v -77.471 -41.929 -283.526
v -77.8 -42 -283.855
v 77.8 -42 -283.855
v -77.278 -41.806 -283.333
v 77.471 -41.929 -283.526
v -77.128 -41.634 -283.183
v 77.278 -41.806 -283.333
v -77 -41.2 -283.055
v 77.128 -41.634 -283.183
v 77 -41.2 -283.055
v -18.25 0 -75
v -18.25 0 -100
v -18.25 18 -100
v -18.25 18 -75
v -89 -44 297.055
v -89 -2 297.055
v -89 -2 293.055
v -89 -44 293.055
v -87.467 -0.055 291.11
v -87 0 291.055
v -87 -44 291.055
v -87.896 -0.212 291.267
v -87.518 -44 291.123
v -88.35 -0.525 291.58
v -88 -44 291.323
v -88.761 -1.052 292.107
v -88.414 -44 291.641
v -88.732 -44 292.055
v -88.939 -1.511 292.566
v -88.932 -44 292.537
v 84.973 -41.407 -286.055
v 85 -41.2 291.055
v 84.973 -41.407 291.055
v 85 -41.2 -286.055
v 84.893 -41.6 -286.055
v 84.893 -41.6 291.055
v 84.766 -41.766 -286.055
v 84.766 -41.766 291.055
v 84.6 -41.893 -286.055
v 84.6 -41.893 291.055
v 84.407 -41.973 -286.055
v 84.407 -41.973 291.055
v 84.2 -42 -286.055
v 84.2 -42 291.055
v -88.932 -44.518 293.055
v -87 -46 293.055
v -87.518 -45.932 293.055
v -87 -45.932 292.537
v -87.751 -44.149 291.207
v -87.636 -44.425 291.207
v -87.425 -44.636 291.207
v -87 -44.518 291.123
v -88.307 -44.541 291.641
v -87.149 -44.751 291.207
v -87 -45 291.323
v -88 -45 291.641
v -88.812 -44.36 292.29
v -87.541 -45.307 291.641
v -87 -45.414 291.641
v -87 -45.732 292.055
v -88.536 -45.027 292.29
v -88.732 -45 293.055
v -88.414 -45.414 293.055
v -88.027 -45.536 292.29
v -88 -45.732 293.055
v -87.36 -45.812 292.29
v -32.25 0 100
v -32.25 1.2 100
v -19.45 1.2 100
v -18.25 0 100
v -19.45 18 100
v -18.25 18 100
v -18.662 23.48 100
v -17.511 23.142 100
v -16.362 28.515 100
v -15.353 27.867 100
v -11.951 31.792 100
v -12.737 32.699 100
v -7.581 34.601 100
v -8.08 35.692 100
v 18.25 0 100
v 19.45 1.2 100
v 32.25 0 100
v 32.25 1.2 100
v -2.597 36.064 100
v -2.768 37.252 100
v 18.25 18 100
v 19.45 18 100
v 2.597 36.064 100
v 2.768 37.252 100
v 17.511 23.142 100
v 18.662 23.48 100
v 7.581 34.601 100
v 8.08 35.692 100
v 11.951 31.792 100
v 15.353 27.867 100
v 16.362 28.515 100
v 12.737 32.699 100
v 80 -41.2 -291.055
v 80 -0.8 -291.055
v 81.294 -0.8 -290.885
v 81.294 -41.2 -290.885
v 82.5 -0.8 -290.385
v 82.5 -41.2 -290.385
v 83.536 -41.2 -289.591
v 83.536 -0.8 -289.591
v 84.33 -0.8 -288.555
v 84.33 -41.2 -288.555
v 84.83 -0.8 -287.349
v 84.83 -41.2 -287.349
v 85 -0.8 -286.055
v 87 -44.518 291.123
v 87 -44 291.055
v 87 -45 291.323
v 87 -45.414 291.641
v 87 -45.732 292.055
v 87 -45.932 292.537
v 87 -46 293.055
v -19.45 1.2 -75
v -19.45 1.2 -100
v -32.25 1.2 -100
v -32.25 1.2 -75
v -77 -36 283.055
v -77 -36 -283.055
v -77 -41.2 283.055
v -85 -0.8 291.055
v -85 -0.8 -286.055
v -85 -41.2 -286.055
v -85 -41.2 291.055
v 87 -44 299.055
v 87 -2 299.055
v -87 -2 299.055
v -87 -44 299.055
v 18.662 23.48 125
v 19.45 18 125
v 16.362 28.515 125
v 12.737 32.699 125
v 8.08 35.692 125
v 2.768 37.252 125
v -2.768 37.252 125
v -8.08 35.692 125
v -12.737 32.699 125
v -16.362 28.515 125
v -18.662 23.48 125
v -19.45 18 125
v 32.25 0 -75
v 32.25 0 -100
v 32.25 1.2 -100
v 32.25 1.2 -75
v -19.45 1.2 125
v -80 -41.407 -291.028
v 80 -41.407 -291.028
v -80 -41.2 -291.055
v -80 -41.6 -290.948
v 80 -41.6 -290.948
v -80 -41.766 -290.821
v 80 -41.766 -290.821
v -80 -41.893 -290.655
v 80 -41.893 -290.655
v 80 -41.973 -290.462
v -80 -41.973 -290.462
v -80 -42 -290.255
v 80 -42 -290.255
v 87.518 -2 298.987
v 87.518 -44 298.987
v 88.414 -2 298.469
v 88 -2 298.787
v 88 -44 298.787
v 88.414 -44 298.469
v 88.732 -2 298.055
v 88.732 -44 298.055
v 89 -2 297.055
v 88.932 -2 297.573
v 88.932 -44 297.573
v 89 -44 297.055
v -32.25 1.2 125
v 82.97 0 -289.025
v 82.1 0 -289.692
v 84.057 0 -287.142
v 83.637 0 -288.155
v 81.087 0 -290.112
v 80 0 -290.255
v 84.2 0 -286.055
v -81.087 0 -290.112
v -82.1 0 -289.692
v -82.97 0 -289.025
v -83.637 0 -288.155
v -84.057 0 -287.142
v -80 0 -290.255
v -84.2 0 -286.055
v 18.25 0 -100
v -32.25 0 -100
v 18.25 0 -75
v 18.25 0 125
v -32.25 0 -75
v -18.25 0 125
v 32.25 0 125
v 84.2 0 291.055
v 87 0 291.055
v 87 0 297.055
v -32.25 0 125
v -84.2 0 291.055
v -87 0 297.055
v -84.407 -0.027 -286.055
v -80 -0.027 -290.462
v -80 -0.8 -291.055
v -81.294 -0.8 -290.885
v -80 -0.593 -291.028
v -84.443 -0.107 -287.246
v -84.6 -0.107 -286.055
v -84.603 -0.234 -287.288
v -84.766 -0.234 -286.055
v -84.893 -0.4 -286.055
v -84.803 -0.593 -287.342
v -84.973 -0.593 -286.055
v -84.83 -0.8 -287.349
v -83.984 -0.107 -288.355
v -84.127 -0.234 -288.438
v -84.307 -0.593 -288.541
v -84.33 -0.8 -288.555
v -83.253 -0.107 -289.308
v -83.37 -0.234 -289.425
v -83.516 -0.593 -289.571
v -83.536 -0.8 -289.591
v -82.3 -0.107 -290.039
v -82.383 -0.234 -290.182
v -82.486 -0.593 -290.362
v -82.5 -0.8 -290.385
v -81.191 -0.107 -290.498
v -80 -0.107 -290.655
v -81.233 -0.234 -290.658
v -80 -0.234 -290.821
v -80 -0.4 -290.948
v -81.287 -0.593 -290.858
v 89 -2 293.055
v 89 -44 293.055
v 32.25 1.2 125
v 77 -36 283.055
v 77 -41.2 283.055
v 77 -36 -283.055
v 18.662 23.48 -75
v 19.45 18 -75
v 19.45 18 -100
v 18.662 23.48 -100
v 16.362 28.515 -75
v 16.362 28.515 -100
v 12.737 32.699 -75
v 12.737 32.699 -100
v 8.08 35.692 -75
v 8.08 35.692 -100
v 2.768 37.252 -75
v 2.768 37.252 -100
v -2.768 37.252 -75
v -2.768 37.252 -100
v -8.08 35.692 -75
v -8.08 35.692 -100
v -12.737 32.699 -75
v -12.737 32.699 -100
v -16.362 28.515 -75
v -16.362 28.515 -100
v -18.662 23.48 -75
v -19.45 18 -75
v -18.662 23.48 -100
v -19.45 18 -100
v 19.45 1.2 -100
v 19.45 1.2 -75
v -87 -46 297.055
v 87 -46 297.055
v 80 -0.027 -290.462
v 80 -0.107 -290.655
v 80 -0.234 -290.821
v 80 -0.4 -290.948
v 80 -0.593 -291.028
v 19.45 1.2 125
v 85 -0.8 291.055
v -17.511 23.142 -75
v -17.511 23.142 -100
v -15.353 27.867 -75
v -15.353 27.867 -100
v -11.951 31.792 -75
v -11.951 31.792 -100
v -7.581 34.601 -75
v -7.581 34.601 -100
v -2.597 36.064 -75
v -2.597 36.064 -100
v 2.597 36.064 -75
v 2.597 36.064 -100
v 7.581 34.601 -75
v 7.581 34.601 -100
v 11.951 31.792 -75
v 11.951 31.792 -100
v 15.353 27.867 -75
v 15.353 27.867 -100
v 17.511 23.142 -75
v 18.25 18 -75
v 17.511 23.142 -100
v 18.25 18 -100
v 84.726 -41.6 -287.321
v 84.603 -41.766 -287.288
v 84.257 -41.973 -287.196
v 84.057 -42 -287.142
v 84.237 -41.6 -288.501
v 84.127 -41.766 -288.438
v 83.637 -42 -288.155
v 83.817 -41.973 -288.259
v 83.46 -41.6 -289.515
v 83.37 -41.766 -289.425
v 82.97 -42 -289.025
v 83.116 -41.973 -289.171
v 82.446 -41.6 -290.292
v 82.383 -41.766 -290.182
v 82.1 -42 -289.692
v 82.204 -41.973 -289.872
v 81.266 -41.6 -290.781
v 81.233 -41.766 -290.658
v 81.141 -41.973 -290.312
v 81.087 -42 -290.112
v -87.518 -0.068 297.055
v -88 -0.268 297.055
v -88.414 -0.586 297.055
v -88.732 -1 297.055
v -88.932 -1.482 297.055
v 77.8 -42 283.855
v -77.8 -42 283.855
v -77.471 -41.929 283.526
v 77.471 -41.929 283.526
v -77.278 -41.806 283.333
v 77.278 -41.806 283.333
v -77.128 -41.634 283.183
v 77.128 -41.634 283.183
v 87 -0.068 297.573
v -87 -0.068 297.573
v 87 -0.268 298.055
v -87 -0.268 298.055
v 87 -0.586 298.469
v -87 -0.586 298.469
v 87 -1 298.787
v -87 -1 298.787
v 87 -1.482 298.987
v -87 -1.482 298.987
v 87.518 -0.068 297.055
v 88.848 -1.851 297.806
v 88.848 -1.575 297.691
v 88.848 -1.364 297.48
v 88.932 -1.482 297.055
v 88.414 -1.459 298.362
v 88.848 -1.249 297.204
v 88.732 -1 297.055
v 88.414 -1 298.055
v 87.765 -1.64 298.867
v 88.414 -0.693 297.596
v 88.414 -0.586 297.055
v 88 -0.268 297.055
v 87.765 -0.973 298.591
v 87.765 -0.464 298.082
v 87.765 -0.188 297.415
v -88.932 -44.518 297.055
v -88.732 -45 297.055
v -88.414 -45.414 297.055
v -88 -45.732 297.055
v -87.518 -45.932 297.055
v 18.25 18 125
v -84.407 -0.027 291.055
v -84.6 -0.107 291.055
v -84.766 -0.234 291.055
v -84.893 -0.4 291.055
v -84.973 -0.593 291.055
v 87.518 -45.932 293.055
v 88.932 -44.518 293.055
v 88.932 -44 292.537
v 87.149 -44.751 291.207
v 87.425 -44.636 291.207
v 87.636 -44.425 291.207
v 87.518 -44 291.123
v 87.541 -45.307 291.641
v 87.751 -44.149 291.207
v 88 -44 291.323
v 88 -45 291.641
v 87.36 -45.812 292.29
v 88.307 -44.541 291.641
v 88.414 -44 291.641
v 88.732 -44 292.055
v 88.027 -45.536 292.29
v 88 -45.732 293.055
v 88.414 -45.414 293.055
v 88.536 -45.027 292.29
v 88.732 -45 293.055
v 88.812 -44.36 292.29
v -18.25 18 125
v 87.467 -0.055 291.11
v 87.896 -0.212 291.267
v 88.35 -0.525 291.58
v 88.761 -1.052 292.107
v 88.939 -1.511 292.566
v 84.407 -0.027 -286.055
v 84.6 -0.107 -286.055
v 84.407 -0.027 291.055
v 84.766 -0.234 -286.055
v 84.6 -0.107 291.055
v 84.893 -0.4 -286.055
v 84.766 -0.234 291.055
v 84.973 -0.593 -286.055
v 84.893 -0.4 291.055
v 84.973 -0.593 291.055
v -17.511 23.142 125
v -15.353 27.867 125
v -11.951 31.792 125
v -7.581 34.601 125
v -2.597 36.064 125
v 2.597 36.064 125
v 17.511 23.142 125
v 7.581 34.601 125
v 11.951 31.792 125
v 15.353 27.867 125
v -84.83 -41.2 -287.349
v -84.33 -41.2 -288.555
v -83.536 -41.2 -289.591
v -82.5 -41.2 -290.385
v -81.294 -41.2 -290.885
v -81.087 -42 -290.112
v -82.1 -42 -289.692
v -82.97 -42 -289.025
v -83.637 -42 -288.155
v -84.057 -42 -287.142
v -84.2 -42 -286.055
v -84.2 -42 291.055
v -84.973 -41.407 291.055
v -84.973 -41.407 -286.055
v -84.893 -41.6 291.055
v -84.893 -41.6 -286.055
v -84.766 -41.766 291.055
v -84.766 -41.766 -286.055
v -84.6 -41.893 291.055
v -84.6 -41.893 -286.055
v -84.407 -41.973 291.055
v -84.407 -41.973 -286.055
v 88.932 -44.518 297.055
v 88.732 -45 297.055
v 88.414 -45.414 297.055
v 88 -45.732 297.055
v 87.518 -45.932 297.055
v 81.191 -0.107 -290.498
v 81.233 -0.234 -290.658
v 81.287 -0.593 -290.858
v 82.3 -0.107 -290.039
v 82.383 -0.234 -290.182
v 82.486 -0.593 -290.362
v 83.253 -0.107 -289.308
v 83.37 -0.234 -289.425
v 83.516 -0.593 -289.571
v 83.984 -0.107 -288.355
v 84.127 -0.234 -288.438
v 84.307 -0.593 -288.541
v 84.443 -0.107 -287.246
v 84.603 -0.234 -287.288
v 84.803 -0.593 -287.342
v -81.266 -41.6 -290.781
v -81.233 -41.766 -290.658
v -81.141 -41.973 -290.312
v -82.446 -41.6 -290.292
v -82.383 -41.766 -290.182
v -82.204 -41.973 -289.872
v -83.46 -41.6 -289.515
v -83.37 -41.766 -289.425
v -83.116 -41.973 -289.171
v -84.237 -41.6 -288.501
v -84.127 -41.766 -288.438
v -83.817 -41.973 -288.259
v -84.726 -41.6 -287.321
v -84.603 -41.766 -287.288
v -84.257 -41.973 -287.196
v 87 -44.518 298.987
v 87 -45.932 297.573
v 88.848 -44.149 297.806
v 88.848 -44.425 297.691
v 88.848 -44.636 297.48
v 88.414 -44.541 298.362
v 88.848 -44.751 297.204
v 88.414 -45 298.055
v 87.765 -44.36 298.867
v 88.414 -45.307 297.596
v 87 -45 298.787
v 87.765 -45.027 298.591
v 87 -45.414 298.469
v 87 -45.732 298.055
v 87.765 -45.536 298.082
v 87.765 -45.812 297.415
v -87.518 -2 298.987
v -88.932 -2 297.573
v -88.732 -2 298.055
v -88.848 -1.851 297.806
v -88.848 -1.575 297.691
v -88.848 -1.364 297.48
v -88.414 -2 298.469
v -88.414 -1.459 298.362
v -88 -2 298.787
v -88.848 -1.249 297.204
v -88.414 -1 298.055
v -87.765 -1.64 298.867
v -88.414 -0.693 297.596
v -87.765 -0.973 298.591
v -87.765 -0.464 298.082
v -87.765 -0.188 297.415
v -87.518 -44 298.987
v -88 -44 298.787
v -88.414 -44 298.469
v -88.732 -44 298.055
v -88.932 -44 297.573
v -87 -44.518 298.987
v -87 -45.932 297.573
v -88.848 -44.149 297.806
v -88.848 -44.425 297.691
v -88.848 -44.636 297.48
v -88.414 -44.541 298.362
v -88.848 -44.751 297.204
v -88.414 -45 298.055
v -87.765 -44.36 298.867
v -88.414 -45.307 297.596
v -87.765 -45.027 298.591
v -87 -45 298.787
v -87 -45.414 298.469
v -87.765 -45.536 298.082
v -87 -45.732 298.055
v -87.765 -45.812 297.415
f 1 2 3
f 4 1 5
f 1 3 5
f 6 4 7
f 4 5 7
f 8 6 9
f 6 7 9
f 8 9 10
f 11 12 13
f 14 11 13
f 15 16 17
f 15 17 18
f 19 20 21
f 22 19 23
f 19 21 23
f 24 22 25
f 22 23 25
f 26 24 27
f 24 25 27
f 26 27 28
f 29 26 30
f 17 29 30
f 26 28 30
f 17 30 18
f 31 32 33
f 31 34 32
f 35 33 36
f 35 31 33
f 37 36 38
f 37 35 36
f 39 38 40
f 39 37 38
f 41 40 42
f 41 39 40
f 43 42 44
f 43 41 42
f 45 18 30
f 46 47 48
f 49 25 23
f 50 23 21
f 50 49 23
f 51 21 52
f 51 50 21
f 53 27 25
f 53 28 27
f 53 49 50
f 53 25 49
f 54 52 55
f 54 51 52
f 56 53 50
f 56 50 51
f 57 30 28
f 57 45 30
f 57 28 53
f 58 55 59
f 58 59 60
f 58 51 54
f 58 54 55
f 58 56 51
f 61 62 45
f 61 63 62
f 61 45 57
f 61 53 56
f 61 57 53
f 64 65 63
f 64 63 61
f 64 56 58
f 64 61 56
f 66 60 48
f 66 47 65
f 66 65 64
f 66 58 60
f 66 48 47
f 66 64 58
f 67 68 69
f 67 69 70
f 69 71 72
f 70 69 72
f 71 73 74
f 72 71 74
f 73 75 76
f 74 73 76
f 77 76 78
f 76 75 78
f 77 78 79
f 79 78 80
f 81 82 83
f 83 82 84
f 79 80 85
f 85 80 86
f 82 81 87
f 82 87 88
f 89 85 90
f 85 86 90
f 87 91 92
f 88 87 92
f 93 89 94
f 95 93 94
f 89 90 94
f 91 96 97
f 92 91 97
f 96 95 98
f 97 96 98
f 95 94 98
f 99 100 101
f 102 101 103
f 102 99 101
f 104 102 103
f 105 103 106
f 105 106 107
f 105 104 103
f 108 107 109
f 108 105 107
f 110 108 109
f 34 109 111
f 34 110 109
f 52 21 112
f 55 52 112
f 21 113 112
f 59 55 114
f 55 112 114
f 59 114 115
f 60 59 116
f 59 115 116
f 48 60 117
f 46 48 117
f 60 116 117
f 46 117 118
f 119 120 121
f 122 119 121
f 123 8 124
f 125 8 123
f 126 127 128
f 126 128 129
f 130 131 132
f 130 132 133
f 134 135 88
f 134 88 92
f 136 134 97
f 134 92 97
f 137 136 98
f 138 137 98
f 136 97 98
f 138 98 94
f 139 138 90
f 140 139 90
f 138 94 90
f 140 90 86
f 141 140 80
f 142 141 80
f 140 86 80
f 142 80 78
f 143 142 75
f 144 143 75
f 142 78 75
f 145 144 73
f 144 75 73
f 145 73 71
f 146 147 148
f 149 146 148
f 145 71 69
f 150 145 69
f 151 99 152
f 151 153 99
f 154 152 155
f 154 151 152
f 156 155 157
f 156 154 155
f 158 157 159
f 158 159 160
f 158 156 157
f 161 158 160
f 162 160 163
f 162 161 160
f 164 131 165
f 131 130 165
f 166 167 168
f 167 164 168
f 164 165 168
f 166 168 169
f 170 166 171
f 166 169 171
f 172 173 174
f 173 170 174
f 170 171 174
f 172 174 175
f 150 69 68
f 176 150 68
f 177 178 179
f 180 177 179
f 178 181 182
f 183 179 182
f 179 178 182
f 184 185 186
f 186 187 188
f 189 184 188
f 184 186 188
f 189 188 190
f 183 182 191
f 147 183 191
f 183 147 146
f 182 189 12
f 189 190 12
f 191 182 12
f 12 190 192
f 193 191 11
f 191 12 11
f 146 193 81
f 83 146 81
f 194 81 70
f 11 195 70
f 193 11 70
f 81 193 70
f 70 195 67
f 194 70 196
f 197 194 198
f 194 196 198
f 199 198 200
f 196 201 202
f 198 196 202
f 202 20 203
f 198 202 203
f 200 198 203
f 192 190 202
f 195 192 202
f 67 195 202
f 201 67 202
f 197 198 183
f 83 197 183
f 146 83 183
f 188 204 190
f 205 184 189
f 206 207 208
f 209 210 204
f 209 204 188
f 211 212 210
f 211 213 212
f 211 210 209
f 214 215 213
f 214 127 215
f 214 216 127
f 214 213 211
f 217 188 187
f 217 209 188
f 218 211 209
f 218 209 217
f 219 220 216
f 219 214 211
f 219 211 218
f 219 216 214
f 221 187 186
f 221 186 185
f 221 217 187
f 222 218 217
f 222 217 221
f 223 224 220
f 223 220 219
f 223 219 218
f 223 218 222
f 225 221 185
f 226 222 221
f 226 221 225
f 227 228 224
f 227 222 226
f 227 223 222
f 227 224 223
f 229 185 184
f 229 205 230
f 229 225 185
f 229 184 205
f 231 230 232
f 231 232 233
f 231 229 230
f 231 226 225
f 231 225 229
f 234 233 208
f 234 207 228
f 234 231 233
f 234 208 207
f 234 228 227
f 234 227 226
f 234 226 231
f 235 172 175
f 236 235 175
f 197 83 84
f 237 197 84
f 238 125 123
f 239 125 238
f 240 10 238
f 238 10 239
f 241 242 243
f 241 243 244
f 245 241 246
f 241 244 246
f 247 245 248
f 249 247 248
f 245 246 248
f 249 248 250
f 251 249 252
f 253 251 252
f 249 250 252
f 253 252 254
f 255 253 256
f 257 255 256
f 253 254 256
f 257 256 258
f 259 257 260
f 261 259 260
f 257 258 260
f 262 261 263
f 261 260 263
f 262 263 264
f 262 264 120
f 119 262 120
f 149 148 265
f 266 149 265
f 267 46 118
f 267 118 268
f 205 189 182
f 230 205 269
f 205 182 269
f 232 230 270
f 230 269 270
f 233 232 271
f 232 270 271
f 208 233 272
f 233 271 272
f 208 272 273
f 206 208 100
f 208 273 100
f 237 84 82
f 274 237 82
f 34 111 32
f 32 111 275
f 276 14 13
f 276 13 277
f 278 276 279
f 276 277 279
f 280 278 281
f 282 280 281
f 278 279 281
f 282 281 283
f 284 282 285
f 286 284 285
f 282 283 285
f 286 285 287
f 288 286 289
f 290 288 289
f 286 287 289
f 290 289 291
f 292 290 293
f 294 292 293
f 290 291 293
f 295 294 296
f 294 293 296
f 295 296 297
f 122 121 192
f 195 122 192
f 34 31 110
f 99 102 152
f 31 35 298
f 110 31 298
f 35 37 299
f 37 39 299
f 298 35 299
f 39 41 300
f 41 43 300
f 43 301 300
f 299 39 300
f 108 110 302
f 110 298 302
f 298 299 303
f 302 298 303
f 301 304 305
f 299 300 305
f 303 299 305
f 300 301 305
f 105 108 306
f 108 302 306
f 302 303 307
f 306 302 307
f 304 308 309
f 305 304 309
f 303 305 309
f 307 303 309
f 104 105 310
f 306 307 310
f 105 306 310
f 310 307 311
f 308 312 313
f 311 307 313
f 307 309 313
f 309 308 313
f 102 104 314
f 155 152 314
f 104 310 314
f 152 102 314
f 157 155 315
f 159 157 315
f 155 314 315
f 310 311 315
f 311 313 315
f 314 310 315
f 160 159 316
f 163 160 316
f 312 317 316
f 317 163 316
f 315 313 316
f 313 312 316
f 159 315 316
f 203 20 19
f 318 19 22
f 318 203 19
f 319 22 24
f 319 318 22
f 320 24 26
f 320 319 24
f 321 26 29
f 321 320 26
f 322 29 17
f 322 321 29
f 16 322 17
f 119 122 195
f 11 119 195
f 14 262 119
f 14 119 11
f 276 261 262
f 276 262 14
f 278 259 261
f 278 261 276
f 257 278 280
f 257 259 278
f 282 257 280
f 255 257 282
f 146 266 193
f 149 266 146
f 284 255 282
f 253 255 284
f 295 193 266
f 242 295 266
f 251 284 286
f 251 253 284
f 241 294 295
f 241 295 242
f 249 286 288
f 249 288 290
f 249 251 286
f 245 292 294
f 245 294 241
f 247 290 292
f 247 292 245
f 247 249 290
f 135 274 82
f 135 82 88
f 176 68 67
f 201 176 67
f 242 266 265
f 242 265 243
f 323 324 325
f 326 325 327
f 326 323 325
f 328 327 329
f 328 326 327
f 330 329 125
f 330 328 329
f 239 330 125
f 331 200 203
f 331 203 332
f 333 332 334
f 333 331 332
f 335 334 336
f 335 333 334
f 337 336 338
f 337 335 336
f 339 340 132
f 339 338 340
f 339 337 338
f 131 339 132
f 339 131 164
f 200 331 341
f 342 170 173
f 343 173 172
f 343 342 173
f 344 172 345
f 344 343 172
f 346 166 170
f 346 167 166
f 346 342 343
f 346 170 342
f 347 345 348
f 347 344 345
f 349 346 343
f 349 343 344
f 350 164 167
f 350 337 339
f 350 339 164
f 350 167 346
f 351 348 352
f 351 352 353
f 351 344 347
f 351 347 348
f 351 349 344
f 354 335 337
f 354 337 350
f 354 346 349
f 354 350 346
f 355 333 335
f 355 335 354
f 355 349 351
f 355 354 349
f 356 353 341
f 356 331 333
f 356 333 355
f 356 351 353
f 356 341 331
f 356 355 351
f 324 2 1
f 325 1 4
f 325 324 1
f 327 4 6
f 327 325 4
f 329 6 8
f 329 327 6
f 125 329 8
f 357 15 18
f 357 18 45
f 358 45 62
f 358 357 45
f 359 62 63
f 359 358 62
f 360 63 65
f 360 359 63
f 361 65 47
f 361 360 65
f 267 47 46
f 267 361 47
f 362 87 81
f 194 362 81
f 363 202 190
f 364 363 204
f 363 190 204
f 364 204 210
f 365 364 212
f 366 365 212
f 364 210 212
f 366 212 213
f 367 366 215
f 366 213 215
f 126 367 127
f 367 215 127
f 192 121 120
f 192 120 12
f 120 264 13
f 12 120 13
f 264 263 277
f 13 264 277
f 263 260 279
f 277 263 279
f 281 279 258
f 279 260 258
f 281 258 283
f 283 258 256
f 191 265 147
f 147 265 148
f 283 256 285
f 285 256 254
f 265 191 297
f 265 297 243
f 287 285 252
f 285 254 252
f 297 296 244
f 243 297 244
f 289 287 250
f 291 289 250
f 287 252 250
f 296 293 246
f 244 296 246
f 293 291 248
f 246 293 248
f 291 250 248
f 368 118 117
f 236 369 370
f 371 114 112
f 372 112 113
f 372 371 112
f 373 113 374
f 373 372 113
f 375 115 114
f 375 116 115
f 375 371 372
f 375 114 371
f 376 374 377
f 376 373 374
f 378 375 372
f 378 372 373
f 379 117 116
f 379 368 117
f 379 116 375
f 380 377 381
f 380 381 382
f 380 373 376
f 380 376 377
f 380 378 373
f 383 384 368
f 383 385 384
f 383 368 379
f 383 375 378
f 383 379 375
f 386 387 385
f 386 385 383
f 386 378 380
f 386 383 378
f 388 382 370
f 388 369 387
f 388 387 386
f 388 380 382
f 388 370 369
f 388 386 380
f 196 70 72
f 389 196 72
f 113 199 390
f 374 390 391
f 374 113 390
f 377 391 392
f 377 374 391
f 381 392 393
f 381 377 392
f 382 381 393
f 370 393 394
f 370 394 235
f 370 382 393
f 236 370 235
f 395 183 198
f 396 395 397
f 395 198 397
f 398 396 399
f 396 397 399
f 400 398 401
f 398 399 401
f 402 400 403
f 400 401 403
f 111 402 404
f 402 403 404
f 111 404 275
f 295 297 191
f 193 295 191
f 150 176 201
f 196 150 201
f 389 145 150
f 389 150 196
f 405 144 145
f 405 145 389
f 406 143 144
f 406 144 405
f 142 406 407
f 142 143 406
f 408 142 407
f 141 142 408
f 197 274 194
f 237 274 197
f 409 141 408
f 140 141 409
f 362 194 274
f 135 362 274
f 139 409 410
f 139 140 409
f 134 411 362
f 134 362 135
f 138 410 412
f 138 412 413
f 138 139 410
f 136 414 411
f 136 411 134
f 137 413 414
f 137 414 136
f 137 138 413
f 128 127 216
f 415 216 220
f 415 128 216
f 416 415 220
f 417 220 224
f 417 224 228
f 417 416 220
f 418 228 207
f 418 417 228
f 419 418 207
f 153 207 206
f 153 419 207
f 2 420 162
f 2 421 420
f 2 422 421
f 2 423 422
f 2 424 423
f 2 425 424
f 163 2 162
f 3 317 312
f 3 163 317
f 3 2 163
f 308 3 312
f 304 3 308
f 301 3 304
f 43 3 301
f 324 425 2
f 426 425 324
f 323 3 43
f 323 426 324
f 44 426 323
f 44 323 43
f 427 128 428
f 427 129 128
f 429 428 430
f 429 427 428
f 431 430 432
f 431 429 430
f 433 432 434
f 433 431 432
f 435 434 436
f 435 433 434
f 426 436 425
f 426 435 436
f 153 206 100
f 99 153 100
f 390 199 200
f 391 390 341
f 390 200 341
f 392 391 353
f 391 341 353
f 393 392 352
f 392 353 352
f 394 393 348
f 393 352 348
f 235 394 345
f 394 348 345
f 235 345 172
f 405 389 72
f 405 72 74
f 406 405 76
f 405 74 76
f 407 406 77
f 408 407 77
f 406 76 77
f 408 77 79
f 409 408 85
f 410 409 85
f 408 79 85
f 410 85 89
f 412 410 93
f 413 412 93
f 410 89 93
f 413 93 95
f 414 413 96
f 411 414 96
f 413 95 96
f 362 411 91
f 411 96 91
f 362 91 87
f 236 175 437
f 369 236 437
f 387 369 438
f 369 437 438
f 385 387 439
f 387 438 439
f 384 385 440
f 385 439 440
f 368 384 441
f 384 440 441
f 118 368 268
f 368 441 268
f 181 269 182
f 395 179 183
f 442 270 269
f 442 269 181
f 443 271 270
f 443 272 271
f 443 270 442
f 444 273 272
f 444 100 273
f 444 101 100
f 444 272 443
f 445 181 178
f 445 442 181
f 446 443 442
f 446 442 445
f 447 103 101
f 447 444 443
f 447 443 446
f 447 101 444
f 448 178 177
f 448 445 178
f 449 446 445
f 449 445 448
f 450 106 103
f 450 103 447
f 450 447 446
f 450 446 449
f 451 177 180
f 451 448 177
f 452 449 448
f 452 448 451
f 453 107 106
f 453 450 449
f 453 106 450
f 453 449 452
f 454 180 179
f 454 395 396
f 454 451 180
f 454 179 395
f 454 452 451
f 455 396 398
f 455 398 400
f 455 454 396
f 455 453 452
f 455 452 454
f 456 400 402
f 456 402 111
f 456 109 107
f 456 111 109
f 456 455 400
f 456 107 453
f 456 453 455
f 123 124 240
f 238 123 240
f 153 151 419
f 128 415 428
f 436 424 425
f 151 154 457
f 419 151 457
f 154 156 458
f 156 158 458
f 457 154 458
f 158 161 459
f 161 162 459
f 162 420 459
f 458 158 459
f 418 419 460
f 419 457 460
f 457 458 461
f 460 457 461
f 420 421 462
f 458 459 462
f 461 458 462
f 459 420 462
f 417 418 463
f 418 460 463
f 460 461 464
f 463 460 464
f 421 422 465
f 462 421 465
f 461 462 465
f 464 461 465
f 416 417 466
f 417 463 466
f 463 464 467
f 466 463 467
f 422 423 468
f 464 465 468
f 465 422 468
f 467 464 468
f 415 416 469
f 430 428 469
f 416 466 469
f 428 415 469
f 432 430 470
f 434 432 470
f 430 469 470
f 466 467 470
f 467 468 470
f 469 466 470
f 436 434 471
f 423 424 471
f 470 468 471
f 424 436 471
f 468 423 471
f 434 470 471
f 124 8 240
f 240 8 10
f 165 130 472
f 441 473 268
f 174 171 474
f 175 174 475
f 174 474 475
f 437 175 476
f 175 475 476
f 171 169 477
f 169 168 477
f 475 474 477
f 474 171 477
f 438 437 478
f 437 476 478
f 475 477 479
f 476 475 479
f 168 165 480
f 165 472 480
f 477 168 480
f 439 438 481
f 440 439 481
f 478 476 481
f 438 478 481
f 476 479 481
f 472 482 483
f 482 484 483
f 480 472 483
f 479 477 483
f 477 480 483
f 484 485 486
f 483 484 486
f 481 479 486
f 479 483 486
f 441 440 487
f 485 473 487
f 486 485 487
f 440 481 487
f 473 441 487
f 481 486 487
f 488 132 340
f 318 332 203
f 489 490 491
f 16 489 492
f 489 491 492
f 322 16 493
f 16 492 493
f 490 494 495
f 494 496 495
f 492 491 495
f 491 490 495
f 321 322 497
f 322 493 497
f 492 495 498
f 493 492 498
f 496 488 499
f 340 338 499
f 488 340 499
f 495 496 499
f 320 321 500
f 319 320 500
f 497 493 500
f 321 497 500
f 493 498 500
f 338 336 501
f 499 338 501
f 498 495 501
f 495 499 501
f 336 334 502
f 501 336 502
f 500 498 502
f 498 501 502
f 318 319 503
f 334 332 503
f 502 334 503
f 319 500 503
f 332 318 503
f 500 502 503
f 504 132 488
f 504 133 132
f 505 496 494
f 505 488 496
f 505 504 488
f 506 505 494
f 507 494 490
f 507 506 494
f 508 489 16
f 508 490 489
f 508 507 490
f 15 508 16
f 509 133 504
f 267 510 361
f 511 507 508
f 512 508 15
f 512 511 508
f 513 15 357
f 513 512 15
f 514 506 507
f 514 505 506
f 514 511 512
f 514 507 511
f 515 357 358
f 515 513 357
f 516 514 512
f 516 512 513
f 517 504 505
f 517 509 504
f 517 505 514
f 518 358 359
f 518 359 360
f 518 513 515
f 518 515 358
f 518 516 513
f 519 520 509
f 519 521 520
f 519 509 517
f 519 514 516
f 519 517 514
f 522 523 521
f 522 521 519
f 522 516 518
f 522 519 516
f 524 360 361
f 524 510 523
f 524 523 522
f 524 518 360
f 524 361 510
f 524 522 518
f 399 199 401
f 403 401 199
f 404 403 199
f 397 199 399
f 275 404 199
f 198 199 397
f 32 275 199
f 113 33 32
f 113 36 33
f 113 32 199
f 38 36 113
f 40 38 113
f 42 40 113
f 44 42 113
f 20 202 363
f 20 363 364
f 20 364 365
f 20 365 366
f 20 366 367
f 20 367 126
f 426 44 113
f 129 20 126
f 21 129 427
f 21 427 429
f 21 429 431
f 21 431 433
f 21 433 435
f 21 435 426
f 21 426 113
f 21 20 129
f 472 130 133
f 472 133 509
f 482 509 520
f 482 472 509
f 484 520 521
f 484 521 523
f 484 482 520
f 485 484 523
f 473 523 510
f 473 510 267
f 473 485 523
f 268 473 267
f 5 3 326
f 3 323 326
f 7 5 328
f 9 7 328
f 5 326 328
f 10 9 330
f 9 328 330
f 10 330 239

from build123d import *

# Parameters (mm, degrees)
F1_W      = 170
F1_H      = 582.11
F2_DEPTH  = 42
F3_W      = 154
F3_H      = 566.11
F4_DEPTH  = 6
F8_R      = 5
F9_R      = 0.8
F7_W      = 46
F7_H      = 8
F10_DEPTH = 178
F11_R     = 2
F15_DEPTH = 25
F17_DEPTH = 25


with BuildPart() as f2:
    # F1 (on Front) → F2 (new body)
    with BuildSketch(Plane.XZ):
        Rectangle(F1_W, F1_H)
    extrude(amount=F2_DEPTH)

    # F3 (on face) → F4 (cut)
    with BuildSketch(Plane.XZ.offset(42)):
        Rectangle(F3_W, F3_H)
    extrude(amount=-F4_DEPTH, mode=Mode.SUBTRACT)

    # F8
    f8_edges = [f2.edges().sort_by_distance(p)[0] for p in [
        (-85, -21, -291.055),
        (85, -21, -291.055),
    ]]
    fillet(f8_edges, radius=F8_R)

    # F9
    f9_edges = [f2.edges().sort_by_distance(p)[0] for p in [
        (-85, -42, 2.5),
        (-77, -42, 0),
        (77, -42, 0),
        (85, -42, 2.5),
        (0, -42, -283.055),
        (85, 0, 2.5),
        (-85, 0, 2.5),
        (0, -42, 283.055),
    ]]
    fillet(f9_edges, radius=F9_R)

    # F7 (on offset) → F10 (join, through all)
    with BuildSketch(Plane(origin=(-89, 0, 0), x_dir=(0, -1, 0), z_dir=(-1, 0, 0))):
        with Locations((23, 295.055)):
            Rectangle(F7_W, F7_H)
    extrude(amount=-F10_DEPTH)

    # F11
    f11_edges = [f2.edges().sort_by_distance(p)[0] for p in [
        (0, -46, 299.055),
        (0, 0, 299.055),
        (-89, -23, 299.055),
        (89, -23, 299.055),
        (-89, -46, 295.055),
        (89, -46, 295.055),
        (89, 0, 295.055),
        (-89, 0, 295.055),
        (-89, -23, 291.055),
        (0, -46, 291.055),
        (89, -23, 291.055),
    ]]
    fillet(f11_edges, radius=F11_R)

    # F14 (on offset) → F15 (join)
    with BuildSketch(Plane.XY.offset(100)):
        with BuildLine():
            Line((-32.25, 1.2), (-32.25, 0))
            Line((-32.25, 0), (-18.25, 0))
            Line((-18.25, 0), (-18.25, 18))
            ThreePointArc((-18.25, 18), (0, 36.25), (18.25, 18))
            Line((18.25, 18), (18.25, 0))
            Line((18.25, 0), (32.25, 0))
            Line((32.25, 0), (32.25, 1.2))
            Line((32.25, 1.2), (19.45, 1.2))
            Line((19.45, 1.2), (19.45, 18))
            ThreePointArc((19.45, 18), (0, 37.45), (-19.45, 18))
            Line((-19.45, 18), (-19.45, 1.2))
            Line((-19.45, 1.2), (-32.25, 1.2))
        make_face()
    extrude(amount=F15_DEPTH)

    # F16 (on offset) → F17 (join)
    with BuildSketch(Plane.XY.offset(-100)):
        with BuildLine():
            Line((32.25, 1.2), (19.45, 1.2))
            Line((19.45, 1.2), (19.45, 18))
            ThreePointArc((19.45, 18), (0, 37.45), (-19.45, 18))
            Line((-19.45, 18), (-19.45, 1.2))
            Line((-19.45, 1.2), (-32.25, 1.2))
            Line((-32.25, 1.2), (-32.25, 0))
            Line((-32.25, 0), (-18.25, 0))
            Line((-18.25, 0), (-18.25, 18))
            ThreePointArc((-18.25, 18), (0, 36.25), (18.25, 18))
            Line((18.25, 18), (18.25, 0))
            Line((18.25, 0), (32.25, 0))
            Line((32.25, 0), (32.25, 1.2))
        make_face()
    extrude(amount=F17_DEPTH)


solid = f2.part
